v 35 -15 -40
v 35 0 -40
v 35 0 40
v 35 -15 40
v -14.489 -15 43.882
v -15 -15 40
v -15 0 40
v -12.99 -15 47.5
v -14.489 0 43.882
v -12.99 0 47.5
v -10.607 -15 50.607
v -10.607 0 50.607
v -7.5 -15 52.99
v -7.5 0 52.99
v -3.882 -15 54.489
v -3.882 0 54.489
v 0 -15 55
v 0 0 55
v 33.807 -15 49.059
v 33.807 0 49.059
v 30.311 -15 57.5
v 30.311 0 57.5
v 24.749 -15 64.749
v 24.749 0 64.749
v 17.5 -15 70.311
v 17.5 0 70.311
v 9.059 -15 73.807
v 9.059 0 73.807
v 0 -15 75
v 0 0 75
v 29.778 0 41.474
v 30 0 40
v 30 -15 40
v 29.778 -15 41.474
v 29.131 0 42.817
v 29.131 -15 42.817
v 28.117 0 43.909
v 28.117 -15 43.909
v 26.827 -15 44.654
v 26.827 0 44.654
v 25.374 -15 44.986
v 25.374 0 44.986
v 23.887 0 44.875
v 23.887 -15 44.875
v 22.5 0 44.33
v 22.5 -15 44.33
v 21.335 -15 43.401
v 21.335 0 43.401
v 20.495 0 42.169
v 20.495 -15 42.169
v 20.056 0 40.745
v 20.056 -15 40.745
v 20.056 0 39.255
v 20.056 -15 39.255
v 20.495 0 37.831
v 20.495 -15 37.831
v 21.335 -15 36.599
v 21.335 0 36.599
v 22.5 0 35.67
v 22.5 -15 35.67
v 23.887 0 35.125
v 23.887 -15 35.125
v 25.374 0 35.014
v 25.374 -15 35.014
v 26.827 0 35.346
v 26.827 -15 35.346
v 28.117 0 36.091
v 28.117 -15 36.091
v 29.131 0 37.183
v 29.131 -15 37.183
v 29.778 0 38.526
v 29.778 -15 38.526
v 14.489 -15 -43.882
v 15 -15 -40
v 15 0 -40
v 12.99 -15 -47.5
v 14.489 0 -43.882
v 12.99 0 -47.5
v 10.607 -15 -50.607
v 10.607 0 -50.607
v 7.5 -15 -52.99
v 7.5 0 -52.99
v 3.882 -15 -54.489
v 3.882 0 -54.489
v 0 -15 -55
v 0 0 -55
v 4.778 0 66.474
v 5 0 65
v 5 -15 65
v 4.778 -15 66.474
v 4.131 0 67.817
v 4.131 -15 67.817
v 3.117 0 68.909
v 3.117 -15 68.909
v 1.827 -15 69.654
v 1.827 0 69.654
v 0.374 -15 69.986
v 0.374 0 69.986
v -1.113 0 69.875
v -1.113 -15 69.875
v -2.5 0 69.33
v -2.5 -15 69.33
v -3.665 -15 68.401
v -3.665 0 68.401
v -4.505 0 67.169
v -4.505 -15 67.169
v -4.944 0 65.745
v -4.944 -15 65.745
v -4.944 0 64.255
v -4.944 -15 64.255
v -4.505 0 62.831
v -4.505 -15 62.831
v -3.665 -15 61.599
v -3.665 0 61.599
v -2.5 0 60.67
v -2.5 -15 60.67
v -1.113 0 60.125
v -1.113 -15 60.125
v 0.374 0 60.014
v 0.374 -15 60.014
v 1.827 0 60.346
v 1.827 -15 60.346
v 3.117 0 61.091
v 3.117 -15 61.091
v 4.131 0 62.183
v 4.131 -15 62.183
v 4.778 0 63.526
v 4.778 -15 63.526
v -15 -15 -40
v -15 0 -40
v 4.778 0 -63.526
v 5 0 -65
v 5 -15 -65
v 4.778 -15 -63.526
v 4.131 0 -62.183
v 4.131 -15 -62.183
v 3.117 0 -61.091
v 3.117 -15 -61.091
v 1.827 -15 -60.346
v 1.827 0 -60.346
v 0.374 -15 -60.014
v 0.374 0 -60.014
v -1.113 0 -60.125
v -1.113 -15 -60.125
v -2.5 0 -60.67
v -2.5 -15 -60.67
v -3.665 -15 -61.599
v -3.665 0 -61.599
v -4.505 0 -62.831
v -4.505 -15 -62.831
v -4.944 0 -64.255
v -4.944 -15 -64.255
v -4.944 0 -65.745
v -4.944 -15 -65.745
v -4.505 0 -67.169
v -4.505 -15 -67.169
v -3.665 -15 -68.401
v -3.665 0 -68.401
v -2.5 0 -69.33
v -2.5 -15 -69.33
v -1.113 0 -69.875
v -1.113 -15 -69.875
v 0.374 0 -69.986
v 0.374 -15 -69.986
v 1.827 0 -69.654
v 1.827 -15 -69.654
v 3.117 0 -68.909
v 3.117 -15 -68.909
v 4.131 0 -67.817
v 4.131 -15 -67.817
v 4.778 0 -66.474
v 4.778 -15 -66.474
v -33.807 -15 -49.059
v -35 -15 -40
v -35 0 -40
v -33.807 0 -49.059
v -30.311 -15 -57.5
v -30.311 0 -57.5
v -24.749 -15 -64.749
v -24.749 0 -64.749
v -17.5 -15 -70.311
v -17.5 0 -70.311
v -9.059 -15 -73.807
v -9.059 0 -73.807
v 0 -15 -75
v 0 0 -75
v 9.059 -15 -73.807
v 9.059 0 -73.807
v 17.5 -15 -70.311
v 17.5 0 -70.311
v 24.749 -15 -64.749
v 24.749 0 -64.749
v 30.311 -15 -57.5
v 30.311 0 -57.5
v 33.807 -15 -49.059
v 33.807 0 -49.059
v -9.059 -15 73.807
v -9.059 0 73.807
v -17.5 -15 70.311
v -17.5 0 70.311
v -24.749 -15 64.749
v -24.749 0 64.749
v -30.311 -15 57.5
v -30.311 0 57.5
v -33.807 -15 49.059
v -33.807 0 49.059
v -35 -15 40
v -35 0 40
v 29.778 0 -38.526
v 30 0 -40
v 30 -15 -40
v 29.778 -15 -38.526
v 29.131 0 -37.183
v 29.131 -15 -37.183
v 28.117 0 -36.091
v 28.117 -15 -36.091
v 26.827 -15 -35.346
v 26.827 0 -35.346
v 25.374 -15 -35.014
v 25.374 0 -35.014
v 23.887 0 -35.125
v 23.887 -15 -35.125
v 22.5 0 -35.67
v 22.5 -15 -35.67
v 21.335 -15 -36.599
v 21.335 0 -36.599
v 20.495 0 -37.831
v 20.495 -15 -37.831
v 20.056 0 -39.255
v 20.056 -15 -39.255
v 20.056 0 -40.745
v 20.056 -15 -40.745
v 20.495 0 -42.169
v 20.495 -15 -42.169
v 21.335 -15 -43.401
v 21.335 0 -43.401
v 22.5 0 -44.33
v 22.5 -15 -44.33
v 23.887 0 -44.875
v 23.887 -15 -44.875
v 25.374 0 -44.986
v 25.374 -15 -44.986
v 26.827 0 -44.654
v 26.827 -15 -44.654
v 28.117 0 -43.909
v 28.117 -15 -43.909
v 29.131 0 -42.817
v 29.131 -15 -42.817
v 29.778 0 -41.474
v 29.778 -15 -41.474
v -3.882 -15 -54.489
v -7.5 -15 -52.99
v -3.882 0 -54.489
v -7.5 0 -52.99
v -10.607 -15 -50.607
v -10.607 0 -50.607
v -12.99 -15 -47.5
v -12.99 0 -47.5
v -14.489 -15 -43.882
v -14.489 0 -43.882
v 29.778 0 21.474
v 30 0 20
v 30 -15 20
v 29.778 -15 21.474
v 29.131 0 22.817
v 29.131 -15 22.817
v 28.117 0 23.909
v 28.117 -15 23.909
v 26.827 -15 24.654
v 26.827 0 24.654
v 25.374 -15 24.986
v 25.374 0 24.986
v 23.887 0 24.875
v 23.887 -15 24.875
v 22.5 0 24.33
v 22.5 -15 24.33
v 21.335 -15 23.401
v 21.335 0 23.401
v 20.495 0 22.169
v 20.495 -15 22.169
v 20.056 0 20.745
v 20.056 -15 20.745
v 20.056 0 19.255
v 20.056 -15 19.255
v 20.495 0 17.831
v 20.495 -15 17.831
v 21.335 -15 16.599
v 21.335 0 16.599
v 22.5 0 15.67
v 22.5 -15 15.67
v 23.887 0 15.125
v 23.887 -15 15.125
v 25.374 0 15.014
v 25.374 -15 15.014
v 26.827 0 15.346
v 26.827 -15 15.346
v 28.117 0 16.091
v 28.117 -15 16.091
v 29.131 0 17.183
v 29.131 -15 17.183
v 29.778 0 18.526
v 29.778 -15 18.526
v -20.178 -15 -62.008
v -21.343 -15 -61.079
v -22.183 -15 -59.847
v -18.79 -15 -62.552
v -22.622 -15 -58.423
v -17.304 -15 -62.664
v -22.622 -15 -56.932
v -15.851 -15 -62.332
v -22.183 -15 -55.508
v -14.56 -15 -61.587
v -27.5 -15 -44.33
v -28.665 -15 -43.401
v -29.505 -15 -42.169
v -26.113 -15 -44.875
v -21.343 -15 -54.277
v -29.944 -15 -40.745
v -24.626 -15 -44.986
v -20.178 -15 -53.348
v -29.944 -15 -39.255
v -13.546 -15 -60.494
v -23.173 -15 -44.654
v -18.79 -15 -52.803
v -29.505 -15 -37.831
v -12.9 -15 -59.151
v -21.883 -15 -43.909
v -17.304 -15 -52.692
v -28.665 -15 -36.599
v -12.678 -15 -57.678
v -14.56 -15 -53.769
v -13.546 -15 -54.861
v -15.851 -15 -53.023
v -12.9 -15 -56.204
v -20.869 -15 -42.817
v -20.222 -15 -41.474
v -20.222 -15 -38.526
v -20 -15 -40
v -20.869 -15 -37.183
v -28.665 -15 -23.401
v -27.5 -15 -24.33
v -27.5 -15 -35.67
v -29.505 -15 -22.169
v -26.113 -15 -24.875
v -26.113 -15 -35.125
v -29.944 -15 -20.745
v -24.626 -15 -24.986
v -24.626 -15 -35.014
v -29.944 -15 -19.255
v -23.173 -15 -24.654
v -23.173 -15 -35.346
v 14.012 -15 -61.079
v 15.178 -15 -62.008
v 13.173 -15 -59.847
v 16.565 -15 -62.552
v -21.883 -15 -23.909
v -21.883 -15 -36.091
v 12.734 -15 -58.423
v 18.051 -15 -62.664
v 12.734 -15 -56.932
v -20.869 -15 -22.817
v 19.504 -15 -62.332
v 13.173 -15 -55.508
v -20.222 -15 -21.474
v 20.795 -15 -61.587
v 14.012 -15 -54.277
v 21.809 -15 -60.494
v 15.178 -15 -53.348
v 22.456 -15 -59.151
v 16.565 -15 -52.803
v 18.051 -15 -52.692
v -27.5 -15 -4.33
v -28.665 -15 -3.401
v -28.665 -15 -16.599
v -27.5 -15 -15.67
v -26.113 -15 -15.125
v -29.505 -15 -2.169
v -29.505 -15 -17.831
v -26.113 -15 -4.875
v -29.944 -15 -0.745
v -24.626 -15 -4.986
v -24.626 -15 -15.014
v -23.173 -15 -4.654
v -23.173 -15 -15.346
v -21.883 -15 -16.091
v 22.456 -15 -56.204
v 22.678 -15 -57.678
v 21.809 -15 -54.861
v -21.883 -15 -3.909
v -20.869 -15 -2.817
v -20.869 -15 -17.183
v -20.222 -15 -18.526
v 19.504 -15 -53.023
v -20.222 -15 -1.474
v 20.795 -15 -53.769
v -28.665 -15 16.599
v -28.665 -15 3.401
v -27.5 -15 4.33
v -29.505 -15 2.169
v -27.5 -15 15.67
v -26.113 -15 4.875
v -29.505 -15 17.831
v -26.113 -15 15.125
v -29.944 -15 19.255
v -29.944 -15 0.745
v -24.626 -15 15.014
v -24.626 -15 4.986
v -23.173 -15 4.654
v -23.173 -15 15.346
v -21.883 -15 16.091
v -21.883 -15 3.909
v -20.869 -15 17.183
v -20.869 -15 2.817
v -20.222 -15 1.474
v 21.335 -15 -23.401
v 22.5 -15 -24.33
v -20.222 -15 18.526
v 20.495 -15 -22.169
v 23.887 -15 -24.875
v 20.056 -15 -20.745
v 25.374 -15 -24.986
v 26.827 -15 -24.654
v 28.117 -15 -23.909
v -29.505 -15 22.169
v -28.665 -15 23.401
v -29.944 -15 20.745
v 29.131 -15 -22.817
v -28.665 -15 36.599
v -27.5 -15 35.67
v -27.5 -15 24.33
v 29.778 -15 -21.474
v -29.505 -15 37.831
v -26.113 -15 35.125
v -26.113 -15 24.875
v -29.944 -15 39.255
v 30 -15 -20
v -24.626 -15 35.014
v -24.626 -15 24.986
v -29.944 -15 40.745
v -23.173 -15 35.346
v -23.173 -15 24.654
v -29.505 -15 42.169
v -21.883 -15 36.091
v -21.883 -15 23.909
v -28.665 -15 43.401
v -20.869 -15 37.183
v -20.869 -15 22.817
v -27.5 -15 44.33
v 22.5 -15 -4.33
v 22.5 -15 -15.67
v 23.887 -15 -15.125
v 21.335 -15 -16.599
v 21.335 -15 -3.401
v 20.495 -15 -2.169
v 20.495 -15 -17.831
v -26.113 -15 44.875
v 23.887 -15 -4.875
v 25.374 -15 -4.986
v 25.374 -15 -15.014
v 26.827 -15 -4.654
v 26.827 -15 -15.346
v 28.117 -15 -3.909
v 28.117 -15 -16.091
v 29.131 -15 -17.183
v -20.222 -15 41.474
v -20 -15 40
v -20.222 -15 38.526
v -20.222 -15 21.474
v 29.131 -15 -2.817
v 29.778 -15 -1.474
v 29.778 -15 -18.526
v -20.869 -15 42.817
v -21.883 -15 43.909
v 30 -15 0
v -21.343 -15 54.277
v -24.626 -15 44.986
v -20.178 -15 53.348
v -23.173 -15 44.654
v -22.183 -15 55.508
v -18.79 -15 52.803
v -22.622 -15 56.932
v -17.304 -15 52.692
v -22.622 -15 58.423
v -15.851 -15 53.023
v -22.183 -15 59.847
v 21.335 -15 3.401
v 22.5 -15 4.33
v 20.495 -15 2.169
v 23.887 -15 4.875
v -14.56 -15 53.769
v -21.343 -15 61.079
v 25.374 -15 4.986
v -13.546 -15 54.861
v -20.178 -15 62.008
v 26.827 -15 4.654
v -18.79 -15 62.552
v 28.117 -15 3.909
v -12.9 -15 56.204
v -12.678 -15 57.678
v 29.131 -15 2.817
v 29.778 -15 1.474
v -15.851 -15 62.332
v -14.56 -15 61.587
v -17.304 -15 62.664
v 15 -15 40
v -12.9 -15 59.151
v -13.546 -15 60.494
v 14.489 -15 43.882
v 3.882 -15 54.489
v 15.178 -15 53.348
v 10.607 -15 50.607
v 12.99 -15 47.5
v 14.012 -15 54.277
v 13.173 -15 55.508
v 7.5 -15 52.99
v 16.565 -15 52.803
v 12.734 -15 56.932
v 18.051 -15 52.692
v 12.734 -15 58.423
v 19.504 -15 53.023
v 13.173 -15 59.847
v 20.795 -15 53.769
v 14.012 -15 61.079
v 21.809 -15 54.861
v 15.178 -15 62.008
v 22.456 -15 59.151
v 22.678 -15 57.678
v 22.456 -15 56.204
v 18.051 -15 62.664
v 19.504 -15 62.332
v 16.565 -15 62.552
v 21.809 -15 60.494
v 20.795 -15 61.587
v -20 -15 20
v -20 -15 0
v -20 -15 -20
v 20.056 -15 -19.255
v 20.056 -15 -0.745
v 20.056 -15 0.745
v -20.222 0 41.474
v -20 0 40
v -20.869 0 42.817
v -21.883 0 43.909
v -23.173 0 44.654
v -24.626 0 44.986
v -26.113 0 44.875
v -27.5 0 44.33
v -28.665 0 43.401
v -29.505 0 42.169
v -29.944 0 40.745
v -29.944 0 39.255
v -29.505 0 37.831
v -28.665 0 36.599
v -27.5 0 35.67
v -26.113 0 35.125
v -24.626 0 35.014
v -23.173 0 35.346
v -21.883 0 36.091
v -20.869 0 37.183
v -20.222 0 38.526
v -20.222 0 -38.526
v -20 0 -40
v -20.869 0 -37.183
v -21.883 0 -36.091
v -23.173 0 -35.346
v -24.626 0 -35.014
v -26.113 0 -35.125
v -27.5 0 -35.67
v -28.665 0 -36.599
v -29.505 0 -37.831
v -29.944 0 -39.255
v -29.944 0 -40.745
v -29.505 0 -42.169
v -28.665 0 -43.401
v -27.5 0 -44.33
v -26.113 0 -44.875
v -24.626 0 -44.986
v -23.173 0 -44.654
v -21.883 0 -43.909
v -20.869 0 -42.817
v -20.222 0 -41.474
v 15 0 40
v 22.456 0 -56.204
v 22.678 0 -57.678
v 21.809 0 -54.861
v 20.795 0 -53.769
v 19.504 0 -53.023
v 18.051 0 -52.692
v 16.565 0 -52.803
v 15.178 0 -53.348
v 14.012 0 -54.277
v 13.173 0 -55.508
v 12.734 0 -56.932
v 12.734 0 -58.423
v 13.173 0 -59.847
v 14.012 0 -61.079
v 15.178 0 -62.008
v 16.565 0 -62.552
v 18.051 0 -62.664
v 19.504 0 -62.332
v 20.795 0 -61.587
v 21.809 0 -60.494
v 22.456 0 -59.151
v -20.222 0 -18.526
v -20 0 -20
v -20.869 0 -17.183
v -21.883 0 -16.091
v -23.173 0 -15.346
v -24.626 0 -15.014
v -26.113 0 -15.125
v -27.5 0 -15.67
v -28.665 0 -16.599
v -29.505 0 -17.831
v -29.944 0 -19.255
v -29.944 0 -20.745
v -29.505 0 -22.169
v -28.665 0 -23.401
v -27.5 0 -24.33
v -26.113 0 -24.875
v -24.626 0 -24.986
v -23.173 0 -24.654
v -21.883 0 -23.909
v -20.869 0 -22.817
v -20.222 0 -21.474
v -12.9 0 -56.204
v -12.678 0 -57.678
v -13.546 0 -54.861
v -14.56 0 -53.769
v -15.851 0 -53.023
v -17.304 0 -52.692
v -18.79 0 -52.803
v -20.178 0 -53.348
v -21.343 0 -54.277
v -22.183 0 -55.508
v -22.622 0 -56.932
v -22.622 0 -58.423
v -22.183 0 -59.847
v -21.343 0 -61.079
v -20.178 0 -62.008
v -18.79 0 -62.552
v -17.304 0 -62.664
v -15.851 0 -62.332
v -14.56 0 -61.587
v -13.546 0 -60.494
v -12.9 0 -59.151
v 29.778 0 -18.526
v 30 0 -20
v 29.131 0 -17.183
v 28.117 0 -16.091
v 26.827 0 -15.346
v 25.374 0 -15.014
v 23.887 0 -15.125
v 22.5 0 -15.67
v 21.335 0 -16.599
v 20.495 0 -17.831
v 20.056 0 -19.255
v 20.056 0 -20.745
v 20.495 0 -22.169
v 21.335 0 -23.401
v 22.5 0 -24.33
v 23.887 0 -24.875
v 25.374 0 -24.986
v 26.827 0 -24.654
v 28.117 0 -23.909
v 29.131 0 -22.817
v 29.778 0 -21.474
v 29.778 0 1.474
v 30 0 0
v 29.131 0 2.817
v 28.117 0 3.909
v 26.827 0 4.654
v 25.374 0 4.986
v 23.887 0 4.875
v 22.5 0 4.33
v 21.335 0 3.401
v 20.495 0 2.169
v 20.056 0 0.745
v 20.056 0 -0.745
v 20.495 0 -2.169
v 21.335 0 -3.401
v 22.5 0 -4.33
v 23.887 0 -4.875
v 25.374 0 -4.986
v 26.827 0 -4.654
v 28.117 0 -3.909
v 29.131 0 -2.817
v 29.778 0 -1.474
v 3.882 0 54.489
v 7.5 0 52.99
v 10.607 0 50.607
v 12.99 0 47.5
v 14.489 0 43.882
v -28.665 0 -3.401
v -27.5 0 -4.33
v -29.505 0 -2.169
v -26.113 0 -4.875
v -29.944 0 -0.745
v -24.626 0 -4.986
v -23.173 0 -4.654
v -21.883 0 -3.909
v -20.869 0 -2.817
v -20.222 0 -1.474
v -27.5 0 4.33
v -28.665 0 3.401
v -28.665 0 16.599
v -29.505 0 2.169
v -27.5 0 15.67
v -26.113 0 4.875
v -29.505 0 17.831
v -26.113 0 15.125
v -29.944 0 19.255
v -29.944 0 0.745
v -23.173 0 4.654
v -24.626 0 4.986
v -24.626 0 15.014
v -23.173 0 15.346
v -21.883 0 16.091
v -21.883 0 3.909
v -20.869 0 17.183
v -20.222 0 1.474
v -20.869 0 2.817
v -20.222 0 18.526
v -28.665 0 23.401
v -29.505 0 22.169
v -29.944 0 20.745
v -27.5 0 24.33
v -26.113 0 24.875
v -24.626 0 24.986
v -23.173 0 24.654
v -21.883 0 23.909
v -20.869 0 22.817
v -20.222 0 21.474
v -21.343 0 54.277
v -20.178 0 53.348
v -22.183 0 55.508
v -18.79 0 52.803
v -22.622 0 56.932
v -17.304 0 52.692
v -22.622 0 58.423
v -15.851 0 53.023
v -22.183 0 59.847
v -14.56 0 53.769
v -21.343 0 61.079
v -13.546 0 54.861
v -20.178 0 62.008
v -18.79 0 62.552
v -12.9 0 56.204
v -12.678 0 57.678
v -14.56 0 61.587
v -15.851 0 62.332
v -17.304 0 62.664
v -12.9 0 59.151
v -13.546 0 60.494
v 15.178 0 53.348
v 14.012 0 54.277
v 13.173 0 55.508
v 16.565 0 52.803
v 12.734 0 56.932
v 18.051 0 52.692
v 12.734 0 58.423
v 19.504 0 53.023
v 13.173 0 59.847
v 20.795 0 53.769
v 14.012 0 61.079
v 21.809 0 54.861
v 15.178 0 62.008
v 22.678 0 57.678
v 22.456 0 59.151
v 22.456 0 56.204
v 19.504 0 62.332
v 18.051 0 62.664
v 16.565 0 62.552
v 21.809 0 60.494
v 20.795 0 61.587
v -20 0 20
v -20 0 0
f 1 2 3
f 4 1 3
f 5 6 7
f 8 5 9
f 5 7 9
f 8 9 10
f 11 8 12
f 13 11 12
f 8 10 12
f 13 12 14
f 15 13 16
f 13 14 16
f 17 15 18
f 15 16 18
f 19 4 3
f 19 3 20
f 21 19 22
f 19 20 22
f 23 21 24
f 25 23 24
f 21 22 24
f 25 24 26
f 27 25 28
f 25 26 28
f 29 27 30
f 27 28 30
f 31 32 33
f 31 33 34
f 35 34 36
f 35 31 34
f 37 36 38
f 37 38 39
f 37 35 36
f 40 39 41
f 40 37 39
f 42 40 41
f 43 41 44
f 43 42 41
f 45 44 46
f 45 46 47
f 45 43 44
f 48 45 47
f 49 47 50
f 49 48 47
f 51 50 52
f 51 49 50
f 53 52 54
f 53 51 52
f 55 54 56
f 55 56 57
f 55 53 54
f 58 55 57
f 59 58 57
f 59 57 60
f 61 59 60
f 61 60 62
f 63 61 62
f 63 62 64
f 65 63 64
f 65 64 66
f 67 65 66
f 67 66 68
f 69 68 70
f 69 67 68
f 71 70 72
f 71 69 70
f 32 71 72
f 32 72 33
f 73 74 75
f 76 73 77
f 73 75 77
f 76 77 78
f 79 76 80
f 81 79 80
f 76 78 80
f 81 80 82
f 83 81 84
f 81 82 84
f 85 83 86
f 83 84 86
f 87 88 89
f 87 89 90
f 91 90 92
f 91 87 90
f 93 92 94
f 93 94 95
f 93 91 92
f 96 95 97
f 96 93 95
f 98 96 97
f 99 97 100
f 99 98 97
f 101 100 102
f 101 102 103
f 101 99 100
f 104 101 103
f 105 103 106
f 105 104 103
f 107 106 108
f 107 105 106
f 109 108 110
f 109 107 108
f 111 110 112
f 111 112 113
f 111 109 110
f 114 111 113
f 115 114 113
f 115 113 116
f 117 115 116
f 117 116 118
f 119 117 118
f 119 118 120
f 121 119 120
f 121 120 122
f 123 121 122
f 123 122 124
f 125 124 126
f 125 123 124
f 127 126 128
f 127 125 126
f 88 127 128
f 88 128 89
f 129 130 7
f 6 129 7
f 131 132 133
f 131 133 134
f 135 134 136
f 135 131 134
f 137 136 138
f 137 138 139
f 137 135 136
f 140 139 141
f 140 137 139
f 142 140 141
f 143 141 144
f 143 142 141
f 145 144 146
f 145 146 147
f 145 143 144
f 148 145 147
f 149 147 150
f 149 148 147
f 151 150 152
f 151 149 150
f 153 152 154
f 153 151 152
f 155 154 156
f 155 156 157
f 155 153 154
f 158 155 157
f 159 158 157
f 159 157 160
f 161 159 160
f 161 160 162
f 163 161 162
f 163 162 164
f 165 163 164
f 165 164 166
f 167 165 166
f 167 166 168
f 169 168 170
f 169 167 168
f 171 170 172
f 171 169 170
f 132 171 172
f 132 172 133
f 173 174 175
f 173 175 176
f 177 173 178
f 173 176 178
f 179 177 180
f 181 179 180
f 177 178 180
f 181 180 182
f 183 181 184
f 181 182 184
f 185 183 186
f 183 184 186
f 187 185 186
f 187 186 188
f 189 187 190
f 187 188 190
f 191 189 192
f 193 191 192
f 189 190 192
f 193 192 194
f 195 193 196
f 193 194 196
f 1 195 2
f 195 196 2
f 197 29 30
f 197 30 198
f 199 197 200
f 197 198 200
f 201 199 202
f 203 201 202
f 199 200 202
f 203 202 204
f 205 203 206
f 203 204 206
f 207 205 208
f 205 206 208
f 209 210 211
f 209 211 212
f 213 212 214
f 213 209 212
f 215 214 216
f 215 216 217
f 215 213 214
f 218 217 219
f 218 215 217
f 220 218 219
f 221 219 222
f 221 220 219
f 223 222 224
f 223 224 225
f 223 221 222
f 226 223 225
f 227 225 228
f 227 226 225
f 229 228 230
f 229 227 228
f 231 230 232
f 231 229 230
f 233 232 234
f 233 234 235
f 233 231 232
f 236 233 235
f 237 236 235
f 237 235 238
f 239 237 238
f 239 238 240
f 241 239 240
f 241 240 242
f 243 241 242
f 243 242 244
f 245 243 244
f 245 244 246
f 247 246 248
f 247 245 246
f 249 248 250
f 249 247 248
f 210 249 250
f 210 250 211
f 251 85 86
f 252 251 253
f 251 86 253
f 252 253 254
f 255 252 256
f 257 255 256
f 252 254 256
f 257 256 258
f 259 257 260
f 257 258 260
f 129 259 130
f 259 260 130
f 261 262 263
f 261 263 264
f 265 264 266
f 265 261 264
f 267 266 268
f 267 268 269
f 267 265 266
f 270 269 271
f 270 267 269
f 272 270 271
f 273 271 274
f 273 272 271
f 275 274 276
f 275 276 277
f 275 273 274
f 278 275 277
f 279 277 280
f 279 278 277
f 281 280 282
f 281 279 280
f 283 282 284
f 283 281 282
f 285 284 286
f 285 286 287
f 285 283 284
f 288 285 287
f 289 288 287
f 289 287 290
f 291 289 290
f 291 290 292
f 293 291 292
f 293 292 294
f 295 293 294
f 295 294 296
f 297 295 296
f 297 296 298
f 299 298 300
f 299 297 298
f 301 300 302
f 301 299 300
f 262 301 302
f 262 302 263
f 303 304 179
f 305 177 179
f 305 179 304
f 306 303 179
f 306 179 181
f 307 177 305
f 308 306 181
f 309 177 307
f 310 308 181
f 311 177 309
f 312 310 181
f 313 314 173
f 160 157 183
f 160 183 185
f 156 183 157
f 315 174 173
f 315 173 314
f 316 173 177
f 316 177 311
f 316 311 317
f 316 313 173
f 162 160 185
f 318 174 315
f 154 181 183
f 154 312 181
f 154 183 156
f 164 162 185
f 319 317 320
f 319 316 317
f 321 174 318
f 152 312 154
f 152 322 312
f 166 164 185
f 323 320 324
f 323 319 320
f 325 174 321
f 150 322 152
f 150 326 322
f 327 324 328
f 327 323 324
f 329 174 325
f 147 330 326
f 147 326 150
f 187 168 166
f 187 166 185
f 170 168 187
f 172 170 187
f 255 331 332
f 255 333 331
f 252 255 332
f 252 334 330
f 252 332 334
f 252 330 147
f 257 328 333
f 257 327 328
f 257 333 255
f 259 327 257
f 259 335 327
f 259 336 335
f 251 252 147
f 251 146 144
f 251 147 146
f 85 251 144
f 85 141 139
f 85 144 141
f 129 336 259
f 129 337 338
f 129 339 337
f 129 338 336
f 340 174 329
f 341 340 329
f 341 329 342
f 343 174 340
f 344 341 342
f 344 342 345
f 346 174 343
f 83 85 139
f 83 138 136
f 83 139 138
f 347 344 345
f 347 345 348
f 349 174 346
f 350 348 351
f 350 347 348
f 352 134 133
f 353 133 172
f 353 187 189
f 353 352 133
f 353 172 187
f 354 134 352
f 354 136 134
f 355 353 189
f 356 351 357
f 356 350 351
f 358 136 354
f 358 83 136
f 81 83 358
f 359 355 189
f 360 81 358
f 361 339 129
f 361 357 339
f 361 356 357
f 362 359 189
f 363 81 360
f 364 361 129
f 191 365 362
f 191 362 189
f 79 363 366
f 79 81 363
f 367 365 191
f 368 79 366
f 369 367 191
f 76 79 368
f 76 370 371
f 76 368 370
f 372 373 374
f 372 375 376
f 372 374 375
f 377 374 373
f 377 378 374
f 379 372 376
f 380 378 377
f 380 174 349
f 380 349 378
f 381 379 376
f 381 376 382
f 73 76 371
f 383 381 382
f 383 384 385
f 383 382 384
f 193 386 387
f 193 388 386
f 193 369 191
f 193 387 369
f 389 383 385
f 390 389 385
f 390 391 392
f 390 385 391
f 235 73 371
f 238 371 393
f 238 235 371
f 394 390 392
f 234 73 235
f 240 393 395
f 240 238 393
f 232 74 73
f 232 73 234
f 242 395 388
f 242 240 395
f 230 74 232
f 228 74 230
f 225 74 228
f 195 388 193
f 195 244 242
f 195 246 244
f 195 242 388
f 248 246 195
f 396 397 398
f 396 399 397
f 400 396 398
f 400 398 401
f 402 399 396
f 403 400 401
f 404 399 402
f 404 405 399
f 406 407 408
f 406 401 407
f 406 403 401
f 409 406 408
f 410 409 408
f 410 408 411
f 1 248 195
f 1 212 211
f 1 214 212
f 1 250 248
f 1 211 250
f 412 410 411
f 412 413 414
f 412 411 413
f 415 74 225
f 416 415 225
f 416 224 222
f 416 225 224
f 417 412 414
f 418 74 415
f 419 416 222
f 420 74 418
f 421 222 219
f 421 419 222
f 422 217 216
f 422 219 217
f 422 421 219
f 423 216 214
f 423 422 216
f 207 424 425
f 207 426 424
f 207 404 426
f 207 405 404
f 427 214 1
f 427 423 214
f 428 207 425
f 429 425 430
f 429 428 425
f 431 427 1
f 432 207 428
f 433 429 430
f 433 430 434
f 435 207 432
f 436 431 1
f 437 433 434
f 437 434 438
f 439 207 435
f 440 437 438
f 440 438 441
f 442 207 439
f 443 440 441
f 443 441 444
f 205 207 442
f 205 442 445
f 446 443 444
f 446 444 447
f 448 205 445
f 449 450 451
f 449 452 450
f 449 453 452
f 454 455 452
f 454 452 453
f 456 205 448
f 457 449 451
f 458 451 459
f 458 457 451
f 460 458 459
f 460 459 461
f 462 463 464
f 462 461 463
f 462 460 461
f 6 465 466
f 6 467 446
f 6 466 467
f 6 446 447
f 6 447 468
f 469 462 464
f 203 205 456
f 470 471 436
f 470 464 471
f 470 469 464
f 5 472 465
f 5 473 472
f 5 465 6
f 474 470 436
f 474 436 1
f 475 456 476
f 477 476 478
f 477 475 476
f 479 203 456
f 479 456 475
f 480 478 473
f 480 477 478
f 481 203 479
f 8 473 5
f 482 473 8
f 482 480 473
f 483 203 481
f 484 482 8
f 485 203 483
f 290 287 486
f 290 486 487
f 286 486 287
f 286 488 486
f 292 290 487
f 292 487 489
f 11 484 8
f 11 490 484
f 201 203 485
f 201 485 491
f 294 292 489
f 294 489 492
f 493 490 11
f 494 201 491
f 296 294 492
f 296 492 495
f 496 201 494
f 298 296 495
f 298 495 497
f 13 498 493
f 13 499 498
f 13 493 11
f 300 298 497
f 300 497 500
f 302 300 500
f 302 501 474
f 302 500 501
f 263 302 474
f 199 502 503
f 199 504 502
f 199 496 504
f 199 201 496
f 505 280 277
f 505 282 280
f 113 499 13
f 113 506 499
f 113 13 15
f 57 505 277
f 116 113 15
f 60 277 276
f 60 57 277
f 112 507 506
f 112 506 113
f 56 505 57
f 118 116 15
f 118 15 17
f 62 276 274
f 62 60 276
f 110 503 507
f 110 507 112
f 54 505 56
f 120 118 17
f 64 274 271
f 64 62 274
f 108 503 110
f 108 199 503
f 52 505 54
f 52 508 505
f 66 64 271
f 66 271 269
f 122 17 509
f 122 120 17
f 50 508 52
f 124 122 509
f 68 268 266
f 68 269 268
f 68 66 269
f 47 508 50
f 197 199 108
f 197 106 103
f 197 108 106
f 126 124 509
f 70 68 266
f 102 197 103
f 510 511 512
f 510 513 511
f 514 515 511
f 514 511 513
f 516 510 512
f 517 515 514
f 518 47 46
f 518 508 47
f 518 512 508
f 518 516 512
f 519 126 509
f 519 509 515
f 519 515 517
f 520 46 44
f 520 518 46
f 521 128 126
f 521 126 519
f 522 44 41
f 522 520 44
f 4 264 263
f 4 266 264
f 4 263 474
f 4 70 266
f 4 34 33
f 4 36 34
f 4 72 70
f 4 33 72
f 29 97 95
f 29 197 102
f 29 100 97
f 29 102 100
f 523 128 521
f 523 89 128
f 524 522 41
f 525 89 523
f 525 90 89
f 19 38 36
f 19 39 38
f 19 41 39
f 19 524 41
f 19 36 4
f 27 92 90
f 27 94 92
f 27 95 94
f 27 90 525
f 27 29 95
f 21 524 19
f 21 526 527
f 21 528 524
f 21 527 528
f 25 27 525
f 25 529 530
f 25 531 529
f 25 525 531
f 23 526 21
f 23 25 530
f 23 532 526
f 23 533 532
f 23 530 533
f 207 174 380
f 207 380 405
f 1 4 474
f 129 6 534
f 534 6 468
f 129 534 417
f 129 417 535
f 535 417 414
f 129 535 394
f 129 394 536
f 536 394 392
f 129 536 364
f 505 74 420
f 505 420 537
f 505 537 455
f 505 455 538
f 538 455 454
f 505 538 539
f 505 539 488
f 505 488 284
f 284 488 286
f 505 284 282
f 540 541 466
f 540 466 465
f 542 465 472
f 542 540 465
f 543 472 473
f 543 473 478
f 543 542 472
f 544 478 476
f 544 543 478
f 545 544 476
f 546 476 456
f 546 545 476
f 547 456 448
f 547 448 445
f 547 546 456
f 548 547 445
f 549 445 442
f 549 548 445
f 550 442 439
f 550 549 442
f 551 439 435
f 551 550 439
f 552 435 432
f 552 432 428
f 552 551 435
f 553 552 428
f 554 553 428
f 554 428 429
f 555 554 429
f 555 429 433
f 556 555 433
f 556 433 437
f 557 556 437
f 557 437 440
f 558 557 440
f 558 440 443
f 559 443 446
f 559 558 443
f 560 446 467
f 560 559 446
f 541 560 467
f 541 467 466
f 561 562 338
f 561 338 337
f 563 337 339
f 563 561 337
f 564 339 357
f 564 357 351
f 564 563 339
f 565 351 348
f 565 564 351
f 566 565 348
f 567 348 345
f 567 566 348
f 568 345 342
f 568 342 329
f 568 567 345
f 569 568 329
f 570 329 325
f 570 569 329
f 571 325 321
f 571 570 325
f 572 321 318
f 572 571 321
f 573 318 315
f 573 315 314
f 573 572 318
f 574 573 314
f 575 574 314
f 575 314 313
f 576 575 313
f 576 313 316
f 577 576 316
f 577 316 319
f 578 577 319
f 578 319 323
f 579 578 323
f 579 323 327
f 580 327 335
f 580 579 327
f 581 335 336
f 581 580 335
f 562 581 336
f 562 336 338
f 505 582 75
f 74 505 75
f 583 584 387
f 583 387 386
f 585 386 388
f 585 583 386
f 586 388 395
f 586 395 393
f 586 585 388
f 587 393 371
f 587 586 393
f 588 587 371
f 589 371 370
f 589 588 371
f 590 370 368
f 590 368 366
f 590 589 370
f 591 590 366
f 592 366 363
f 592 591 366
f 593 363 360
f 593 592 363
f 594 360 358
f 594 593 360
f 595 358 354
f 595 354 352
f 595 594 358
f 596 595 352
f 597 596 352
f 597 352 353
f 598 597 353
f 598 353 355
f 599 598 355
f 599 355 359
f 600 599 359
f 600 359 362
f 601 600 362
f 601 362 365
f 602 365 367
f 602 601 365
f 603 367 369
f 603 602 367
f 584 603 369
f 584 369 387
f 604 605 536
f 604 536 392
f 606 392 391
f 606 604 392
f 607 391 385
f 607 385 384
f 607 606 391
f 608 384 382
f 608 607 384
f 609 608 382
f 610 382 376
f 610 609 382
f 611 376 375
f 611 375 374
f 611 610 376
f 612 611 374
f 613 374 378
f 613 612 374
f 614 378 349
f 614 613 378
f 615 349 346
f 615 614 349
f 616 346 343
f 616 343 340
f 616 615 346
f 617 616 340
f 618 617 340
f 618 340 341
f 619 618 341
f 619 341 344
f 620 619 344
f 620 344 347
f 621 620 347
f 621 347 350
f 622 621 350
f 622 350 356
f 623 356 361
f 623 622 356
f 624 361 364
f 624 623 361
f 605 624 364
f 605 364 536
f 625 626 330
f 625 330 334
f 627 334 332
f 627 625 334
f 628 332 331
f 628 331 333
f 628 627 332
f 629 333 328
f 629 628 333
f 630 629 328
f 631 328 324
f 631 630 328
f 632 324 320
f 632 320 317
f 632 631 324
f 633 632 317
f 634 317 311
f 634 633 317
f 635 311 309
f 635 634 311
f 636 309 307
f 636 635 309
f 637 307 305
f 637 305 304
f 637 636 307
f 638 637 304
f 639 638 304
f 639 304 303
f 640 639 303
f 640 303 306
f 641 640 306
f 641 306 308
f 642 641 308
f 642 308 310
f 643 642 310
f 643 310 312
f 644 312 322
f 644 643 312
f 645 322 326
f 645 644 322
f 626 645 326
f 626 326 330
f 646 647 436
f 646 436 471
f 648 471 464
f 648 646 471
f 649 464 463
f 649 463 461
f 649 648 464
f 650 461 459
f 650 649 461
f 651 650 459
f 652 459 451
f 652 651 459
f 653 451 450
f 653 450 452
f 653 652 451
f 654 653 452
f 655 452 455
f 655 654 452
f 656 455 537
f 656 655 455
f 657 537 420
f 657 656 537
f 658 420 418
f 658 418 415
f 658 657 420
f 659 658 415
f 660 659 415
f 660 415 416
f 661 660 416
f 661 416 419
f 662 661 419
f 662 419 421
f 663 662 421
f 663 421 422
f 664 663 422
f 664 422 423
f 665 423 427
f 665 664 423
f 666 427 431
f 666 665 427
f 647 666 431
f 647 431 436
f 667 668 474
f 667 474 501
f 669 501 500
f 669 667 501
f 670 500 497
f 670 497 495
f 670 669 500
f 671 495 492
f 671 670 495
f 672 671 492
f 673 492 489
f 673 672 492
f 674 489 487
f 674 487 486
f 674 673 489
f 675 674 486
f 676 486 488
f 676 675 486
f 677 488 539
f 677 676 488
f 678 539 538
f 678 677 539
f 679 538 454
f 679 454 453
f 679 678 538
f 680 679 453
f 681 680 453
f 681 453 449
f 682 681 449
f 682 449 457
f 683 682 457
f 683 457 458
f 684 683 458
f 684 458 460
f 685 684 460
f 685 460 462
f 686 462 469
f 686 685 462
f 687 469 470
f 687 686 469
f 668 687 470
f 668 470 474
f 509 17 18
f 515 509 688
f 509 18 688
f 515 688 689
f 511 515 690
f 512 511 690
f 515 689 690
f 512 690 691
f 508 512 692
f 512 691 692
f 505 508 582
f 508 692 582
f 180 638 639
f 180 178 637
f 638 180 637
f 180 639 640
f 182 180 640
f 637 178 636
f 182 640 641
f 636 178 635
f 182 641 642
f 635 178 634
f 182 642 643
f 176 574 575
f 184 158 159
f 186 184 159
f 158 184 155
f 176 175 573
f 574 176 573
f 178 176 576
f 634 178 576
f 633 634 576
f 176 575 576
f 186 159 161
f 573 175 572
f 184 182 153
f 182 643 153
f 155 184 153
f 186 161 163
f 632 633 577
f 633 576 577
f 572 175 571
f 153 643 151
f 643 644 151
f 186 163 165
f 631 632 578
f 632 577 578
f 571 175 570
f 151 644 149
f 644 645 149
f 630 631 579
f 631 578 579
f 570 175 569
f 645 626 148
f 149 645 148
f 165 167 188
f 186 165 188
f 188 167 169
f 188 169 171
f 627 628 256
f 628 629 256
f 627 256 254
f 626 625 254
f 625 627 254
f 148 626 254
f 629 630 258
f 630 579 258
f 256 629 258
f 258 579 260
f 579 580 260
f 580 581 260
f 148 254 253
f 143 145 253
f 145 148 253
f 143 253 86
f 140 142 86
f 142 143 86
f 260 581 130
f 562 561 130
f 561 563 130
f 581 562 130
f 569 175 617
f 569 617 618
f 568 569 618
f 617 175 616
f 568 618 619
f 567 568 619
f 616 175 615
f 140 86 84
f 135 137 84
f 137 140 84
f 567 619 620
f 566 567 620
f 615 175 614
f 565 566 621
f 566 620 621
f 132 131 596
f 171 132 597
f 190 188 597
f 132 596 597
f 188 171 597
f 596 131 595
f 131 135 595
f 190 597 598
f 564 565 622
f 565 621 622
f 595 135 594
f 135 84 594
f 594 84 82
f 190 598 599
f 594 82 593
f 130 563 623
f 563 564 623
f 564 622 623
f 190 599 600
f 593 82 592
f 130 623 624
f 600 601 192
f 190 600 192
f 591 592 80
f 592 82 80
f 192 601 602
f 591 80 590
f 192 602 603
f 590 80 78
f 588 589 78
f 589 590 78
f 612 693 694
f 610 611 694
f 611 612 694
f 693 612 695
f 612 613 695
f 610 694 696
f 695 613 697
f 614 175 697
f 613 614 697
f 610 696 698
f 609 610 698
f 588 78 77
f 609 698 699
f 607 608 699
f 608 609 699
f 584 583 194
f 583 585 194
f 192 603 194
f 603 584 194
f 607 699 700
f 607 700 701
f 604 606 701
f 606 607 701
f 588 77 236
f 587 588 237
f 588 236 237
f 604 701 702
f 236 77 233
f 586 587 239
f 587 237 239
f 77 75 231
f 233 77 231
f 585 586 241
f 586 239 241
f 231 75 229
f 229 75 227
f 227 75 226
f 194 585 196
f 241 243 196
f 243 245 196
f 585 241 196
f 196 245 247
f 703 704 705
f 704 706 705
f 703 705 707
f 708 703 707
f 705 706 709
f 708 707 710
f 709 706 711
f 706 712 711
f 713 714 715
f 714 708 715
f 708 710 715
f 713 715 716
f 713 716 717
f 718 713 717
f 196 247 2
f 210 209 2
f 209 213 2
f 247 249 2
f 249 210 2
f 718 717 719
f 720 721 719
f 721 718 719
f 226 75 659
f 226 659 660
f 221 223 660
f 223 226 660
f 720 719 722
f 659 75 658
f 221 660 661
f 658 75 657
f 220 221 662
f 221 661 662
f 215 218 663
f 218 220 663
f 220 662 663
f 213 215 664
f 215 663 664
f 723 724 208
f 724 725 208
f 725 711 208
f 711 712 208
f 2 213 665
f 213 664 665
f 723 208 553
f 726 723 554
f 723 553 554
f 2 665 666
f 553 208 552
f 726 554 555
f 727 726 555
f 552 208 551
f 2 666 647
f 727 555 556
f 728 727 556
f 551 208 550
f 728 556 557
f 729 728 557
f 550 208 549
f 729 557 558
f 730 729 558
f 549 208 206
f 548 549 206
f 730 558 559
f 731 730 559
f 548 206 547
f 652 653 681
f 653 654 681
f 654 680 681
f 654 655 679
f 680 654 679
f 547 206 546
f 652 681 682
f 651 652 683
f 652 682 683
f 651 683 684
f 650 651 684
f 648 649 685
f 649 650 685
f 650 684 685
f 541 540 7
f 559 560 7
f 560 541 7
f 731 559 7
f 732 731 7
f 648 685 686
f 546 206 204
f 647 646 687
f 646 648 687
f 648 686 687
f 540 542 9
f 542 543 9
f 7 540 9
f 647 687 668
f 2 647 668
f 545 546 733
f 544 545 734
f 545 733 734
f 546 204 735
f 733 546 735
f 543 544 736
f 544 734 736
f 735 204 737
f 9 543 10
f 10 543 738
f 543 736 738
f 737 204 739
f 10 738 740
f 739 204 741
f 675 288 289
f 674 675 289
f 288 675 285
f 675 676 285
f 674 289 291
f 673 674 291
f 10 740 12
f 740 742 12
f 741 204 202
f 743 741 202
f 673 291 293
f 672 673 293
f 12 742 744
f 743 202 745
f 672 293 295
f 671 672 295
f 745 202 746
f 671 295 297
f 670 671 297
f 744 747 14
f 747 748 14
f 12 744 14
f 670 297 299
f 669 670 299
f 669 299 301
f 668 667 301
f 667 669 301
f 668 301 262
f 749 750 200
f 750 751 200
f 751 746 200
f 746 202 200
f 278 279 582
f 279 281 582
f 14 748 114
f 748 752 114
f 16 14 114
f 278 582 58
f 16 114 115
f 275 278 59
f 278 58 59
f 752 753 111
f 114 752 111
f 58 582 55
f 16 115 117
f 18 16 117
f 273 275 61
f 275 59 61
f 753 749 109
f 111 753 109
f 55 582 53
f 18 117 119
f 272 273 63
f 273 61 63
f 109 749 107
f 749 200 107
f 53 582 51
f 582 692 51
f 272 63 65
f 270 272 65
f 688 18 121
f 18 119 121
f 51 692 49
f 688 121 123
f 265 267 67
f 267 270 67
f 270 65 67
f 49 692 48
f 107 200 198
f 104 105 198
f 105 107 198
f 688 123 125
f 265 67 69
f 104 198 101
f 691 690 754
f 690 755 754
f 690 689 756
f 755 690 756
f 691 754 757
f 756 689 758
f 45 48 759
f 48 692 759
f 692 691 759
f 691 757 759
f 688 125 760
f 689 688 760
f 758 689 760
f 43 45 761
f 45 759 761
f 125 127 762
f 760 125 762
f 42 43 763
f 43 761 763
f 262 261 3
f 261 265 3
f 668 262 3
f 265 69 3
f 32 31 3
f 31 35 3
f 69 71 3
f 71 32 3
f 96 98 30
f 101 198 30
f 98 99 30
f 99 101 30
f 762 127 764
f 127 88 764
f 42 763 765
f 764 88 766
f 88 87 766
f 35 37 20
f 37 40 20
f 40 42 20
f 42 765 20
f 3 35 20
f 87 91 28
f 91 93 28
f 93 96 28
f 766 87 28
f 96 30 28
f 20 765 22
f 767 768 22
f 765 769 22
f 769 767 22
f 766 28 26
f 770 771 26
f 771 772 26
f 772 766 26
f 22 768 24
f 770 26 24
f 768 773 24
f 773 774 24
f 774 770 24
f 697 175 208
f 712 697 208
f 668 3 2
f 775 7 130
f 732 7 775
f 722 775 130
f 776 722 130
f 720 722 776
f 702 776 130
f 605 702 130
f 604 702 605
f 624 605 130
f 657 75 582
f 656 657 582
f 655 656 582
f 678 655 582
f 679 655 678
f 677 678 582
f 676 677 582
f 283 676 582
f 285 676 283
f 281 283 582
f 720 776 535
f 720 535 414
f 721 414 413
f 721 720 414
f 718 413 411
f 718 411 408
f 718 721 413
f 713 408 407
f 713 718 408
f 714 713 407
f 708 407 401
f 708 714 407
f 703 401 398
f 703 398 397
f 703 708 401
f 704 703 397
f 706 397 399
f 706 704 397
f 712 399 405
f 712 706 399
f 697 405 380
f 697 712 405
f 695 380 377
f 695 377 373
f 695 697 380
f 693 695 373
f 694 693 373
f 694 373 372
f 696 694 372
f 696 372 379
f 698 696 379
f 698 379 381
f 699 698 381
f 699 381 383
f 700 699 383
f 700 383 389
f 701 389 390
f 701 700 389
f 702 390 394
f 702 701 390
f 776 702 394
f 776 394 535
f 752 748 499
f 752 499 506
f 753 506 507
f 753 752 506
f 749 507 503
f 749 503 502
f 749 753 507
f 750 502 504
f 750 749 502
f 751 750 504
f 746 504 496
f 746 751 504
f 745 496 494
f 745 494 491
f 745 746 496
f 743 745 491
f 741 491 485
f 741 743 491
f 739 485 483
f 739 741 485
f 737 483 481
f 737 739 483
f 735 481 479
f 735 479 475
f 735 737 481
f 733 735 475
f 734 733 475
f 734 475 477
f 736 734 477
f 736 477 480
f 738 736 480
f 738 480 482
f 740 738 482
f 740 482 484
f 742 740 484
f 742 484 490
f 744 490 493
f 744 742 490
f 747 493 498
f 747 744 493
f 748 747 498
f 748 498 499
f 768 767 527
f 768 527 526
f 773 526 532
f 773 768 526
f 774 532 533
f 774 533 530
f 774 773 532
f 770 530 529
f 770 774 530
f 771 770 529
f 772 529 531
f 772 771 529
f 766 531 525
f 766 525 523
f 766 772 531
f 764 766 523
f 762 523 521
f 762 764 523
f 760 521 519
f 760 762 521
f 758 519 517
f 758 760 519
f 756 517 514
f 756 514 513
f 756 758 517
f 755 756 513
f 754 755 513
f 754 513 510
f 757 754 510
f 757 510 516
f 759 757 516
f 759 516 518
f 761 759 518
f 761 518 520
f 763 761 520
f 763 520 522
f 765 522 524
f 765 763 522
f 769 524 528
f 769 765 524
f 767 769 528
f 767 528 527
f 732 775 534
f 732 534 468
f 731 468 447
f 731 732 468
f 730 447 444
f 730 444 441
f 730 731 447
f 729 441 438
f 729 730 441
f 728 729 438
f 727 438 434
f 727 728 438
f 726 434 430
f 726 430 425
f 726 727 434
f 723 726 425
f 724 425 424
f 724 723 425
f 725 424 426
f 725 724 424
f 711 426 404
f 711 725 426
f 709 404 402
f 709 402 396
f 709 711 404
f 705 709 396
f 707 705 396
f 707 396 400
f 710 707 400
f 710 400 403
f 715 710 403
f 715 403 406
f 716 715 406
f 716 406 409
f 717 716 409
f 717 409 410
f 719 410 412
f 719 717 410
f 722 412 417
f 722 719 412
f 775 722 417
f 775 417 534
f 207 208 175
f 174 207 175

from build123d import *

# Parameters (mm, degrees)
F0_R     = 5
F1_DEPTH = 15


with BuildPart() as f1:
    # F0 (on Front) → F1 (new body)
    with BuildSketch(Plane.XZ):
        with BuildLine():
            ThreePointArc((0, 75), (-24.748737, 64.748737), (-35, 40))
            Line((-35, 40), (-35, 0))
            Line((-35, 0), (-35, -40))
            ThreePointArc((-35, -40), (-24.748737, -64.748737), (0, -75))
            ThreePointArc((0, -75), (24.748737, -64.748737), (35, -40))
            Line((35, -40), (35, 0))
            Line((35, 0), (35, 40))
            ThreePointArc((35, 40), (24.748737, 64.748737), (0, 75))
        make_face()
        with Locations((-17.67767, -57.67767)):
            Circle(F0_R, mode=Mode.SUBTRACT)
        with Locations((-25, -40)):
            Circle(F0_R, mode=Mode.SUBTRACT)
        with Locations((-25, -20)):
            Circle(F0_R, mode=Mode.SUBTRACT)
        with Locations((0, -65)):
            Circle(F0_R, mode=Mode.SUBTRACT)
        with Locations((17.67767, -57.67767)):
            Circle(F0_R, mode=Mode.SUBTRACT)
        with Locations((25, -40)):
            Circle(F0_R, mode=Mode.SUBTRACT)
        with Locations((25, -20)):
            Circle(F0_R, mode=Mode.SUBTRACT)
        with Locations((-25, 0)):
            Circle(F0_R, mode=Mode.SUBTRACT)
        with Locations((-25, 20)):
            Circle(F0_R, mode=Mode.SUBTRACT)
        with Locations((-25, 40)):
            Circle(F0_R, mode=Mode.SUBTRACT)
        with Locations((-17.67767, 57.67767)):
            Circle(F0_R, mode=Mode.SUBTRACT)
        with BuildLine():
            ThreePointArc((-15, 40), (-10.606602, 50.606602), (0, 55))
            ThreePointArc((0, 55), (10.606602, 50.606602), (15, 40))
            Line((15, 40), (15, 0))
            Line((15, 0), (15, -40))
            ThreePointArc((15, -40), (10.606602, -50.606602), (0, -55))
            ThreePointArc((0, -55), (-10.606602, -50.606602), (-15, -40))
            Line((-15, -40), (-15, 0))
            Line((-15, 0), (-15, 40))
        make_face(mode=Mode.SUBTRACT)
        with Locations((25, 0)):
            Circle(F0_R, mode=Mode.SUBTRACT)
        with Locations((25, 20)):
            Circle(F0_R, mode=Mode.SUBTRACT)
        with Locations((0, 65)):
            Circle(F0_R, mode=Mode.SUBTRACT)
        with Locations((25, 40)):
            Circle(F0_R, mode=Mode.SUBTRACT)
        with Locations((17.67767, 57.67767)):
            Circle(F0_R, mode=Mode.SUBTRACT)
    extrude(amount=F1_DEPTH)


solid = f1.part
